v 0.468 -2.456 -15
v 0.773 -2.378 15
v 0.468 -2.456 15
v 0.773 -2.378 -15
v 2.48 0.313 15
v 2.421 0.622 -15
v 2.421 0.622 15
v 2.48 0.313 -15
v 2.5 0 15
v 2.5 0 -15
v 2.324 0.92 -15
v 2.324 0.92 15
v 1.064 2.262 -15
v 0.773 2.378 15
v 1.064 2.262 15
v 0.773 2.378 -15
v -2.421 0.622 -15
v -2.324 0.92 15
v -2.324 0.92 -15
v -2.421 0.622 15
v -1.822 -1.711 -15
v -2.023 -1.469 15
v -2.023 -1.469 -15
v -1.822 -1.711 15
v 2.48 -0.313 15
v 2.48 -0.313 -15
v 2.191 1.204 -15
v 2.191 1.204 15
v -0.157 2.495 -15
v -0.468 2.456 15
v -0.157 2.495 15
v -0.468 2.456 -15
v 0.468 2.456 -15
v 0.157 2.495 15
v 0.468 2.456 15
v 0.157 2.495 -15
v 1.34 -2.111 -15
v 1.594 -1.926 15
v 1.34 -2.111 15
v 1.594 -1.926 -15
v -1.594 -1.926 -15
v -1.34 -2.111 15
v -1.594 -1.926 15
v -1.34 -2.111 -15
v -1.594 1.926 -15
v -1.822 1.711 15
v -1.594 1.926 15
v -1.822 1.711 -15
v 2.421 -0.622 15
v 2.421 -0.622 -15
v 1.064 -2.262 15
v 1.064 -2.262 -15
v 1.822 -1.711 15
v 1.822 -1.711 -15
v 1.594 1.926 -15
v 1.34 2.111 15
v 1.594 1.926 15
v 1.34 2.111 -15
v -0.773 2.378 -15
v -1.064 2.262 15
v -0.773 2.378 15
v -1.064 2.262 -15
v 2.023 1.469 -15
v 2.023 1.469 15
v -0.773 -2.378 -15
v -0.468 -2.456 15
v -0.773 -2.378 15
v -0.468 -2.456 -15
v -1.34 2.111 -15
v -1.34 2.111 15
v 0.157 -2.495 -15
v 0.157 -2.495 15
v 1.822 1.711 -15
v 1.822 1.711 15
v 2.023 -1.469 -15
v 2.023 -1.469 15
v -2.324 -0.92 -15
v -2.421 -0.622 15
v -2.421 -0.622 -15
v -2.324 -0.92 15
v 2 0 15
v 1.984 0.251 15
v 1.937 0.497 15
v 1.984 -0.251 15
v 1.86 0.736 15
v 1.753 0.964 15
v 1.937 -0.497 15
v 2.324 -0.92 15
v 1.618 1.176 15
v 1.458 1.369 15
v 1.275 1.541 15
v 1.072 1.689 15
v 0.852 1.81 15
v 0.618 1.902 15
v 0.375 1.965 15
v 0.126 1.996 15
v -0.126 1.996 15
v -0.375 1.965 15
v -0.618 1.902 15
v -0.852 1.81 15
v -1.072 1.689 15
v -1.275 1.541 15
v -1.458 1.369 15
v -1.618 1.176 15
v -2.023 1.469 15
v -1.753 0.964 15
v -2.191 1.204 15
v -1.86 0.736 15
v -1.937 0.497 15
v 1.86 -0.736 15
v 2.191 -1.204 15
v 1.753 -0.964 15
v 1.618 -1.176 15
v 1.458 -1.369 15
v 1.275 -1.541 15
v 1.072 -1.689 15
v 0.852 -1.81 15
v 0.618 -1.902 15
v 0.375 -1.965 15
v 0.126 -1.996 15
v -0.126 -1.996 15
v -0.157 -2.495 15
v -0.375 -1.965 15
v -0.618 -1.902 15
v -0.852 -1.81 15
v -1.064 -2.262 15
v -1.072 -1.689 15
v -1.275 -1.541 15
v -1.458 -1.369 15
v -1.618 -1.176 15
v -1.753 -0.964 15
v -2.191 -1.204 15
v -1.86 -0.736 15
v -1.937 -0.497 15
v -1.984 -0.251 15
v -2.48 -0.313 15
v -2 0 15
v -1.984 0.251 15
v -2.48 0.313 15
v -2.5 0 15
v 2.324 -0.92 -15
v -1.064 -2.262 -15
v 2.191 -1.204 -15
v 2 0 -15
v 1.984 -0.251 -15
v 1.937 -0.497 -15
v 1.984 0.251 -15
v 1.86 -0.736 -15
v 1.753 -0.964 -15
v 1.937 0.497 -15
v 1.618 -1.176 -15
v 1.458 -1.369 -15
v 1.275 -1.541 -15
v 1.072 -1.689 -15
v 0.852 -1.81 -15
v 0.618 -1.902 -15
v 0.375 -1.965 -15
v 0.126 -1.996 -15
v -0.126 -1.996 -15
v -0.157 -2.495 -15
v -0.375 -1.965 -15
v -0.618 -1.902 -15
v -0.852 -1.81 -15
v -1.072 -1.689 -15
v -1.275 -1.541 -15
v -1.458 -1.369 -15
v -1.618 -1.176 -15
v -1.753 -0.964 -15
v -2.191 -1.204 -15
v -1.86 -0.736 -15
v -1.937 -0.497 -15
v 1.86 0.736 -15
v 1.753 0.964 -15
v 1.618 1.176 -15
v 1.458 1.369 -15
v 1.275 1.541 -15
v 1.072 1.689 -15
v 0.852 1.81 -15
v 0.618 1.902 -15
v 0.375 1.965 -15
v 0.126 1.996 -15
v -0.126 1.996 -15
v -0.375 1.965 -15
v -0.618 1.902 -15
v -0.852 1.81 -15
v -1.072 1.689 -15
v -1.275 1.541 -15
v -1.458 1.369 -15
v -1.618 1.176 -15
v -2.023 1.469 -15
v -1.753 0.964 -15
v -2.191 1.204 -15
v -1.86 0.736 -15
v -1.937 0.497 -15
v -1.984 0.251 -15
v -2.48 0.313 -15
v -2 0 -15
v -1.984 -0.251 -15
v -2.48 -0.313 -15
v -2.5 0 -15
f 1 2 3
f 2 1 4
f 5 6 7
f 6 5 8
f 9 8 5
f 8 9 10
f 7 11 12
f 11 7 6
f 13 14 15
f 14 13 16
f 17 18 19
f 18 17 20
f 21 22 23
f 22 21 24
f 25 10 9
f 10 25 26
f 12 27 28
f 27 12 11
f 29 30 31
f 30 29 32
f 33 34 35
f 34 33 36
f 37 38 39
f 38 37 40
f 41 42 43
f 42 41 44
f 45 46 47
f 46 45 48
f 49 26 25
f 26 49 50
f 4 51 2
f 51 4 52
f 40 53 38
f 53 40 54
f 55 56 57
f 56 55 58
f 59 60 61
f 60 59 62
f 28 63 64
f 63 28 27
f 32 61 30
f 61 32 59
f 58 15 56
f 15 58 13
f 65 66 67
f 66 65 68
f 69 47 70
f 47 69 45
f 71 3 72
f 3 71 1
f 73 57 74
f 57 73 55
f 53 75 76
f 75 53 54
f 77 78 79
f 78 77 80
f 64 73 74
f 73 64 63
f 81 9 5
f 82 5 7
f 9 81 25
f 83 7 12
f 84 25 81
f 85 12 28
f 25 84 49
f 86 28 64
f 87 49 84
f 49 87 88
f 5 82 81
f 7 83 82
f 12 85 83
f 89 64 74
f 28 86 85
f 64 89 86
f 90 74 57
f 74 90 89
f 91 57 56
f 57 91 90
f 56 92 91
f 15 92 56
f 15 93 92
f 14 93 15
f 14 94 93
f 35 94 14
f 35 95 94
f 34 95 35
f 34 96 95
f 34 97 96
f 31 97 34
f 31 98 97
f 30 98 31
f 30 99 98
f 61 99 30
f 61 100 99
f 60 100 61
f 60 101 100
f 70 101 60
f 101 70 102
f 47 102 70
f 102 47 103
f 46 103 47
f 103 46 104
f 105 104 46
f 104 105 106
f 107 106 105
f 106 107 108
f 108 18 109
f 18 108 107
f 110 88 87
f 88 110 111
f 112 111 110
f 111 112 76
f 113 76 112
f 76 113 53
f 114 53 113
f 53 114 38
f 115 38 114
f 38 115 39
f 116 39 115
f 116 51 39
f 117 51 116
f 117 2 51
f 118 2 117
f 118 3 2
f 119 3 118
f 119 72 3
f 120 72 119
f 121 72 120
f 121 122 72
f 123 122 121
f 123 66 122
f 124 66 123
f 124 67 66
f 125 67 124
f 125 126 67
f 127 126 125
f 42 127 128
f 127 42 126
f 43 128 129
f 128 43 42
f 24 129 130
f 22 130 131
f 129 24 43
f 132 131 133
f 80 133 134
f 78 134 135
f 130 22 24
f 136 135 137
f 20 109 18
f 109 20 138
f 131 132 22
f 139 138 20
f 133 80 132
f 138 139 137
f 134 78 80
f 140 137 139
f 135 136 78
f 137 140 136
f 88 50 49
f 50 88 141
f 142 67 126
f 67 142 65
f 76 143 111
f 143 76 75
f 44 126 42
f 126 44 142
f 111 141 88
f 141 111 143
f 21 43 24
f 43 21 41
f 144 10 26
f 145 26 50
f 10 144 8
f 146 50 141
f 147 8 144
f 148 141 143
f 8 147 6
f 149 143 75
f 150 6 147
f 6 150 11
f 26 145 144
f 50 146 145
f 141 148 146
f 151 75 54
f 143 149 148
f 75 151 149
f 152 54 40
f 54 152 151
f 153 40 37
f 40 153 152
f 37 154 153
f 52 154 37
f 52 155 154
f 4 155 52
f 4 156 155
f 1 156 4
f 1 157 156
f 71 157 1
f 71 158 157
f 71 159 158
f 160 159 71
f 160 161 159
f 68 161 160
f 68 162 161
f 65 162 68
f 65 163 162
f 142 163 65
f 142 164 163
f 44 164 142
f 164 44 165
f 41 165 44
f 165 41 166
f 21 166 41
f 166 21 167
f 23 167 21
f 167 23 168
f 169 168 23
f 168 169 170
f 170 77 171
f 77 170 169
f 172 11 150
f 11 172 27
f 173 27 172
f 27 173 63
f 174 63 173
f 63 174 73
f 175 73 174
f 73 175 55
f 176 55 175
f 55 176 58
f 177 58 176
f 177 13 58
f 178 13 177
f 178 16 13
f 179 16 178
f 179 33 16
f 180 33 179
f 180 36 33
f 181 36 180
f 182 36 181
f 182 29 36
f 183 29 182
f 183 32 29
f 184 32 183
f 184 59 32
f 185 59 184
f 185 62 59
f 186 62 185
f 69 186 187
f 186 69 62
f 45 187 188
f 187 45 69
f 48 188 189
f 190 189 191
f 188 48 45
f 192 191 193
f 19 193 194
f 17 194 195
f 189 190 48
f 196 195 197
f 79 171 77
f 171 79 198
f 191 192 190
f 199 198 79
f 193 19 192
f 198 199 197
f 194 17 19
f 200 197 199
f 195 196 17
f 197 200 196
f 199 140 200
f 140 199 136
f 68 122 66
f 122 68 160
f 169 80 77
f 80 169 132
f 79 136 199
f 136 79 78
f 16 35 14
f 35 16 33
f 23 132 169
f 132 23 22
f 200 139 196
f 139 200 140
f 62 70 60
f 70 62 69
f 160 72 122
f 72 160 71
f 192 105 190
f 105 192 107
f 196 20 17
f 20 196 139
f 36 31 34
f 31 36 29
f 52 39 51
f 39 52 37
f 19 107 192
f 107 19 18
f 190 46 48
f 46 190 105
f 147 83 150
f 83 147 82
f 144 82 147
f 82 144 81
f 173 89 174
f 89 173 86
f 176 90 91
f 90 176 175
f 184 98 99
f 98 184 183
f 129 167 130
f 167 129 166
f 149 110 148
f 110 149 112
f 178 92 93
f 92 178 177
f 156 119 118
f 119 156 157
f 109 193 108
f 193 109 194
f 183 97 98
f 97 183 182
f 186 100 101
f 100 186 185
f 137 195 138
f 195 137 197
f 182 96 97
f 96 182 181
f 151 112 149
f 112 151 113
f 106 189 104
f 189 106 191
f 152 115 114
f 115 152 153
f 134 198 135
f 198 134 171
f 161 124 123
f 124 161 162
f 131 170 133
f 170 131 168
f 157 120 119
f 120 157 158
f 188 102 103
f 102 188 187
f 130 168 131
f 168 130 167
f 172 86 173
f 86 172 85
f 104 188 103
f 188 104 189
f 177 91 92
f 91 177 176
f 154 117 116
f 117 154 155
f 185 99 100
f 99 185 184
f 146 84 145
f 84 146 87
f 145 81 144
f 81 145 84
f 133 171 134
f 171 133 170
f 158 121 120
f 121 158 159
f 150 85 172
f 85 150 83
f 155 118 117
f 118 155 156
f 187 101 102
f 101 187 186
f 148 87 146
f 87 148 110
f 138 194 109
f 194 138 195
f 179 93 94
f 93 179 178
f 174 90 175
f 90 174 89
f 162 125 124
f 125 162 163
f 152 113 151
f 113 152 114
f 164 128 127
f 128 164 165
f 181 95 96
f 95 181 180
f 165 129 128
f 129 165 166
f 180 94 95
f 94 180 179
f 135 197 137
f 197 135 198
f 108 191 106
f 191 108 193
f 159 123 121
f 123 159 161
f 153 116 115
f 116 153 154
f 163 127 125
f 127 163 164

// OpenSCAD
$fn = 50;


difference() {
	union() {
		translate(v = [0, 0, -15.0000000000]) {
			cylinder(h = 30, r = 2.5000000000);
		}
	}
	union() {
		translate(v = [0, 0, -100.0000000000]) {
			cylinder(h = 200, r = 2.0000000000);
		}
	}
}
